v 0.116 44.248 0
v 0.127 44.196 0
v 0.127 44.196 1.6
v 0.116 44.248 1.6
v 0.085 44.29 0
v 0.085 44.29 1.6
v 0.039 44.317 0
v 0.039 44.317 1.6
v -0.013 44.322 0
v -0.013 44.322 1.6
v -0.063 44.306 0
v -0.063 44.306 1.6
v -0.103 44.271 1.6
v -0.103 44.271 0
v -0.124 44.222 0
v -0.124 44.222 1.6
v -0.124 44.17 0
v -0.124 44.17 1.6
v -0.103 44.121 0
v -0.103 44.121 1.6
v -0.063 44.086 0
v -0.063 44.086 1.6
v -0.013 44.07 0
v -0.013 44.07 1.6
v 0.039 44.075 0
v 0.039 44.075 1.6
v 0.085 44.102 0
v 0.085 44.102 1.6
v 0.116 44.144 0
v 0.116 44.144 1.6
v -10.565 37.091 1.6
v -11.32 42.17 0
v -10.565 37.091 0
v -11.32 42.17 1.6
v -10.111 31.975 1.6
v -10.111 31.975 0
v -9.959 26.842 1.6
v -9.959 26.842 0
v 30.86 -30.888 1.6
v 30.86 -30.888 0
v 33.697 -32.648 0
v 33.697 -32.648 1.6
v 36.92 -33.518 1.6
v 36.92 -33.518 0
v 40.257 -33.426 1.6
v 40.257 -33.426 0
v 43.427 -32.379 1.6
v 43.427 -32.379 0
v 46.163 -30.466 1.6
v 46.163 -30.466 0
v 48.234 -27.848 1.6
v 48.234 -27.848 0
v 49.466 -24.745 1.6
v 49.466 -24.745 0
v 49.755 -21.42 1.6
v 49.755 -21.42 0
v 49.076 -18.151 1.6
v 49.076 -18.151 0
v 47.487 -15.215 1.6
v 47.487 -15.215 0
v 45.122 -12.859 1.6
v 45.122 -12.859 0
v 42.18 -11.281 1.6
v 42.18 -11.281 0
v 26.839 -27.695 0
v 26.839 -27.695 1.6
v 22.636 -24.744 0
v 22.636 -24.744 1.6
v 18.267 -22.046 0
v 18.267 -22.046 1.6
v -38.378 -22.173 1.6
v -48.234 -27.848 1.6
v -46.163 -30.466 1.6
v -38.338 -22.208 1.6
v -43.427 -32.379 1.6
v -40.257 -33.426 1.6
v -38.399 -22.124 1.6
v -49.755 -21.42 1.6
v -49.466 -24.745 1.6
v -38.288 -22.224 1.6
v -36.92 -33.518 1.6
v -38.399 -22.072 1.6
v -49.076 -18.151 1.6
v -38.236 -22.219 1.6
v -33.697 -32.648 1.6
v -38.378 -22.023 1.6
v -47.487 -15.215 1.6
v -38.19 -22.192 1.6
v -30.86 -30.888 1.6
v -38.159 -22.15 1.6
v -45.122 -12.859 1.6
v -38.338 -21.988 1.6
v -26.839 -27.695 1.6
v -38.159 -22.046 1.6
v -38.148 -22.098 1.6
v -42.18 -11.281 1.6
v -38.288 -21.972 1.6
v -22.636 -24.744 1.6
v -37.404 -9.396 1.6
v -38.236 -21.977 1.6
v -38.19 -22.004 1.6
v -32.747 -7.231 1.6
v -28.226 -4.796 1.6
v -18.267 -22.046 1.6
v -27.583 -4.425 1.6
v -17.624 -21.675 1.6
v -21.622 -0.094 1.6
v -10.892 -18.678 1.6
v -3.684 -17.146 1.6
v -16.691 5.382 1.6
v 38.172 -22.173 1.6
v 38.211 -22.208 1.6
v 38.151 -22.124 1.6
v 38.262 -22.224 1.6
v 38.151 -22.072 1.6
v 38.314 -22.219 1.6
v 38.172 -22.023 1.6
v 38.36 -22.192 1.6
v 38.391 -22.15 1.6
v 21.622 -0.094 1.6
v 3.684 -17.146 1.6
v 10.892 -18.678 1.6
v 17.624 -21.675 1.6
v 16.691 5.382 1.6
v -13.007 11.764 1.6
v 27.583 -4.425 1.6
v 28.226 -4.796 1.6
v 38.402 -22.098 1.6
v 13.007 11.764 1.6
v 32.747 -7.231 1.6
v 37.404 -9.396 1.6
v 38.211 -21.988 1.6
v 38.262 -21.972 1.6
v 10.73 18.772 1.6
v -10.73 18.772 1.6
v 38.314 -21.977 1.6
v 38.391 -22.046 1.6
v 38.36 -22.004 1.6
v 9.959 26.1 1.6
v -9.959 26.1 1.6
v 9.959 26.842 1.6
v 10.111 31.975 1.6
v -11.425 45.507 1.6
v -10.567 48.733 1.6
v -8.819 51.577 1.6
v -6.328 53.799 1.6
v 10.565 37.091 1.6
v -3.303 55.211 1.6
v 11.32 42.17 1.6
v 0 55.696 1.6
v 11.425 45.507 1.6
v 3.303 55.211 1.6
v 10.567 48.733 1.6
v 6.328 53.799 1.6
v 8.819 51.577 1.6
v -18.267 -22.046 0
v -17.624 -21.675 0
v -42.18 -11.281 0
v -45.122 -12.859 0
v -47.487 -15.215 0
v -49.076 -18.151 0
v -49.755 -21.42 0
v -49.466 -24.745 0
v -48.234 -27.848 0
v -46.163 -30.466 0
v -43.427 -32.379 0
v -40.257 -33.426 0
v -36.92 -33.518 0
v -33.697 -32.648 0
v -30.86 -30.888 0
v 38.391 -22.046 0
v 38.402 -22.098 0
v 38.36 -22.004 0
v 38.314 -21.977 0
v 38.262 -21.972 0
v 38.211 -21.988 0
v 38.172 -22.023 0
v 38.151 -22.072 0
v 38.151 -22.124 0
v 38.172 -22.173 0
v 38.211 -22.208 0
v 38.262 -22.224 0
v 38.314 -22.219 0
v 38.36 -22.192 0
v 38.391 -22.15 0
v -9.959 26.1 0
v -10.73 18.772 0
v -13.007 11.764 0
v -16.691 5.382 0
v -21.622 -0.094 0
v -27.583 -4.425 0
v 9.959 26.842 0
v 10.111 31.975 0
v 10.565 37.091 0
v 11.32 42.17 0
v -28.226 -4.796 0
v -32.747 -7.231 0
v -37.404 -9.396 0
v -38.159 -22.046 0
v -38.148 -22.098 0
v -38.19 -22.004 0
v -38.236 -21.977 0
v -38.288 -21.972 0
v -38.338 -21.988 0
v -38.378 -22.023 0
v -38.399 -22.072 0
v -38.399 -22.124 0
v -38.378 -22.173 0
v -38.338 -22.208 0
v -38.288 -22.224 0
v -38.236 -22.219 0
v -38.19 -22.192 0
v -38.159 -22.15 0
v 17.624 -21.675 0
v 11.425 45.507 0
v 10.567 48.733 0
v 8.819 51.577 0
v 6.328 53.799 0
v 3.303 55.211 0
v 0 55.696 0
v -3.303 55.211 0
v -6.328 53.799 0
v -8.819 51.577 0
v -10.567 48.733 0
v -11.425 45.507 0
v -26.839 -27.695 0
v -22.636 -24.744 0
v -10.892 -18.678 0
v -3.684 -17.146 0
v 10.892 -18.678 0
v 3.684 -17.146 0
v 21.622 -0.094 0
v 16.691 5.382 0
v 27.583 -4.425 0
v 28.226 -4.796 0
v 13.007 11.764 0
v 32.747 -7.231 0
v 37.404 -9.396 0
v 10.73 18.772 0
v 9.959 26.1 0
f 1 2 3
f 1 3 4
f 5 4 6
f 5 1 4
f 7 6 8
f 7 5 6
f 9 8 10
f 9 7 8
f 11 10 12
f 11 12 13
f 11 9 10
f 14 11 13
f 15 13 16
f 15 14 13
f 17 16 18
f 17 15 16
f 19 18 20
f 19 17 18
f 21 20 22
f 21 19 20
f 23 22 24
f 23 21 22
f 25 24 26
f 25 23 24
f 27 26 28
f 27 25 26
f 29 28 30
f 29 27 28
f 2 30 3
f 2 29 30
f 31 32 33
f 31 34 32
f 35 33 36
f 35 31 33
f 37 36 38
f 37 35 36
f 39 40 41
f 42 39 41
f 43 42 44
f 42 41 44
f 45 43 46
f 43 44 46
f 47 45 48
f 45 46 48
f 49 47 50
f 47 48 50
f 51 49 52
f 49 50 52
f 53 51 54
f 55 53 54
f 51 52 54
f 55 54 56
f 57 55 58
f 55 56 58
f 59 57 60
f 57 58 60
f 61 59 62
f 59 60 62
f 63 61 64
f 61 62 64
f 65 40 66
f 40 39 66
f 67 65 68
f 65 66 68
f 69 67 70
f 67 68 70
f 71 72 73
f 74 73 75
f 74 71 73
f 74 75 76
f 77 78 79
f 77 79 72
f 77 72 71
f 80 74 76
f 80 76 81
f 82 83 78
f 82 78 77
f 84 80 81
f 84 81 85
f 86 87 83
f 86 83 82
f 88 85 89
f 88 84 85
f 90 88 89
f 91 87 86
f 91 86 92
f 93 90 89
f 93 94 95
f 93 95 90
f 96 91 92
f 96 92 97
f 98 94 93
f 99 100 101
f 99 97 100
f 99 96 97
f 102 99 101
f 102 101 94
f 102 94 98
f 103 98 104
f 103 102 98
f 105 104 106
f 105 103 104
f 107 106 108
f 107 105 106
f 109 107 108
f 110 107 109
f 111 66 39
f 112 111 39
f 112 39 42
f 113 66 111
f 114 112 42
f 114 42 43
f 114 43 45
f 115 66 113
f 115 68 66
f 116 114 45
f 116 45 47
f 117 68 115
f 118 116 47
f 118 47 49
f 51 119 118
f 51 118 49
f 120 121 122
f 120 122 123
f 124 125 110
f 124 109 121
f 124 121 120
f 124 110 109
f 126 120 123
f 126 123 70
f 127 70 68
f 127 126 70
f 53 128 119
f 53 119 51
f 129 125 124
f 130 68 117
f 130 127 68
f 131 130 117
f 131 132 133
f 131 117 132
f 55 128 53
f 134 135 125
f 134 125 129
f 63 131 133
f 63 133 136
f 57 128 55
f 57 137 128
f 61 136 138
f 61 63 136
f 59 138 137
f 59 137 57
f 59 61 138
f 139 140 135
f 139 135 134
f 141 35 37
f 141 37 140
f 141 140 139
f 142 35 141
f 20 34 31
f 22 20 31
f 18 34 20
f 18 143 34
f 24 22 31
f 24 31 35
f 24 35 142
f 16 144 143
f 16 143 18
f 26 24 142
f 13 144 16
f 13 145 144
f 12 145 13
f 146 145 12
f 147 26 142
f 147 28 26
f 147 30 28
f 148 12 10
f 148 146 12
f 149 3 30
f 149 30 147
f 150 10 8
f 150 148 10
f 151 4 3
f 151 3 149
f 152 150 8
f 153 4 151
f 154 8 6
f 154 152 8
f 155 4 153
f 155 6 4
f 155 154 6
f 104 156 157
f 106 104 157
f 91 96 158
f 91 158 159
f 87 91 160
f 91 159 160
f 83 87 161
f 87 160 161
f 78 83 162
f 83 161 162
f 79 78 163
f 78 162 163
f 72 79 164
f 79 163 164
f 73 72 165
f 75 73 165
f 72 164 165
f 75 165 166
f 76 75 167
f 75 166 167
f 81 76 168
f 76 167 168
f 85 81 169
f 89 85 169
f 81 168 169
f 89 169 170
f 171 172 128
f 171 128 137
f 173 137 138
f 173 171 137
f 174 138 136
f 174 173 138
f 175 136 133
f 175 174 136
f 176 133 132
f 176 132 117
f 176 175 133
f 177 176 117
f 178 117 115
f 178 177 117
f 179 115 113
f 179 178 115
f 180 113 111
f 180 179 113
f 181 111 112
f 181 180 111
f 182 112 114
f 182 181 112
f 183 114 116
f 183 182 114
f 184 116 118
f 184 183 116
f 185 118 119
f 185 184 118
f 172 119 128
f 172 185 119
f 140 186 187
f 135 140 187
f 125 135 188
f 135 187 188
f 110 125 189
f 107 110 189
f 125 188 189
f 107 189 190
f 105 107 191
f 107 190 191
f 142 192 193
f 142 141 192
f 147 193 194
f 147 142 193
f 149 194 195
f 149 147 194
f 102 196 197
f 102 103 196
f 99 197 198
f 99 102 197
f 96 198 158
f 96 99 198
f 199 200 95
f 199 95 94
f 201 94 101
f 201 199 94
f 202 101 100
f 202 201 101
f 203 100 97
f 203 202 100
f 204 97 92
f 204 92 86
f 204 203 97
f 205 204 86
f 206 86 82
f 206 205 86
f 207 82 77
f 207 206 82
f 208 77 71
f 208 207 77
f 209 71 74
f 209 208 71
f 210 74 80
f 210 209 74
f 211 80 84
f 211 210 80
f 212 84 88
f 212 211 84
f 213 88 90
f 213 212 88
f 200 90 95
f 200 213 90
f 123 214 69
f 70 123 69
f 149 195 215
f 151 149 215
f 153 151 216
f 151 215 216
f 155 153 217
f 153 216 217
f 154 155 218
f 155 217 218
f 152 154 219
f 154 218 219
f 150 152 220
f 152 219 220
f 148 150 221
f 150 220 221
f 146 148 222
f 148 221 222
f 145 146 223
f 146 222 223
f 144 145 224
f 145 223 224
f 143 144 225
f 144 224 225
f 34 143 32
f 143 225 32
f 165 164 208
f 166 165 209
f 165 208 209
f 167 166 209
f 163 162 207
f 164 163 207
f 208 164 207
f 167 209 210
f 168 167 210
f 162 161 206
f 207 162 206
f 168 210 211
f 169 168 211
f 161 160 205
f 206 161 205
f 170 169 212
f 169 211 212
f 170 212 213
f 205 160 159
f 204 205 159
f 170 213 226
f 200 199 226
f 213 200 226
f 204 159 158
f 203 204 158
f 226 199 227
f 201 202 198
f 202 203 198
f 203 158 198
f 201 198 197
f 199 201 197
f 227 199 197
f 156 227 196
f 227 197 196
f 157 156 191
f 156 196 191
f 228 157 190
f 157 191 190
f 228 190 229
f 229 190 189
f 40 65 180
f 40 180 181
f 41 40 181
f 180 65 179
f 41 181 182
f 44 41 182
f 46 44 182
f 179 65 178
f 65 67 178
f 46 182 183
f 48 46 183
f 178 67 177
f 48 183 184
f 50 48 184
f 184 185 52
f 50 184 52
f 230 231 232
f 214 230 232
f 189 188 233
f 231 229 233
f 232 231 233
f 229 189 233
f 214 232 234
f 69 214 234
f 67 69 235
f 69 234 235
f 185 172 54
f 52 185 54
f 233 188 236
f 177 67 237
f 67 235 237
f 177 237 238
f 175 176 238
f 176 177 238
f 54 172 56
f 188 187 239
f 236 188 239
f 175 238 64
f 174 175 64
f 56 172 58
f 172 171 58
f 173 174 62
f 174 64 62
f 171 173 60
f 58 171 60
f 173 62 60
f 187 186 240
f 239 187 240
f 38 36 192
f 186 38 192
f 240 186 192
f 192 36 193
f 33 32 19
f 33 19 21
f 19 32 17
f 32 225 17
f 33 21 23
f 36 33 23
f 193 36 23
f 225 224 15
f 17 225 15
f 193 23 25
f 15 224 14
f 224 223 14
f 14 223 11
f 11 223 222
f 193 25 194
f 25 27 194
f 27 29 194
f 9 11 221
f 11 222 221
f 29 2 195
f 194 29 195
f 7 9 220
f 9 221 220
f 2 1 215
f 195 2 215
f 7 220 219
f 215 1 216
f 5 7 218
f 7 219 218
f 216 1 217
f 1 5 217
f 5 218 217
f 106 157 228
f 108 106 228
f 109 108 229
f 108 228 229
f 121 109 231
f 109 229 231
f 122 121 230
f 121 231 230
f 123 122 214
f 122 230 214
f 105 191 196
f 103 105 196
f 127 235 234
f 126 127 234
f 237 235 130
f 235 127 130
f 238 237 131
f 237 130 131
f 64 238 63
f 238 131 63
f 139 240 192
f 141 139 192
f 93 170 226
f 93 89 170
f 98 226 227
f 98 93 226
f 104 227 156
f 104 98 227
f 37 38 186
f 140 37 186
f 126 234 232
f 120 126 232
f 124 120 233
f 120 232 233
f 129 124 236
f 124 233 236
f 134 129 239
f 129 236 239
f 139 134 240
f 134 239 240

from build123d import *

# Parameters (mm, degrees)
F1_R     = 0.127
F2_DEPTH = 1.6
F3_R     = 87


with BuildPart() as f2:
    # F1 (on Top) → F2 (new body)
    with BuildSketch(Plane.XY):
        with BuildLine():
            Line((9.9592921435, 26.1), (9.9592921435, 38.446))
            ThreePointArc((9.9592921435, 38.446), (0, 55.696), (-9.9592921435, 38.446))
            Line((-9.9592921435, 38.446), (-9.9592921435, 26.1))
            ThreePointArc((-9.9592921435, 26.1), (-14.6815260775, 8.476383033), (-27.5829091105, -4.425))
            Line((-27.5829091105, -4.425), (-38.2748587457, -10.598))
            ThreePointArc((-38.2748587457, -10.598), (-48.2341508892, -27.848), (-28.3155666021, -27.848))
            Line((-28.3155666021, -27.848), (-17.623616967, -21.675))
            ThreePointArc((-17.623616967, -21.675), (0, -16.952766066), (17.623616967, -21.675))
            Line((17.623616967, -21.675), (28.3155666021, -27.848))
            ThreePointArc((28.3155666021, -27.848), (48.2341508892, -27.848), (38.2748587457, -10.598))
            Line((38.2748587457, -10.598), (27.5829091105, -4.425))
            ThreePointArc((27.5829091105, -4.425), (14.6815260775, 8.476383033), (9.9592921435, 26.1))
        make_face()
        with Locations((-38.2748587457, -22.098)):
            Circle(F1_R, mode=Mode.SUBTRACT)
        with Locations((38.2748587457, -22.098)):
            Circle(F1_R, mode=Mode.SUBTRACT)
        with Locations((0, 44.196)):
            Circle(F1_R, mode=Mode.SUBTRACT)
    extrude(amount=F2_DEPTH)

    # F3
    f3_edges = [f2.edges().sort_by_distance(p)[0] for p in [
        (-28.315567, -27.848, 0.8),
        (-38.274859, -10.598, 0.8),
        (28.315567, -27.848, 0.8),
        (38.274859, -10.598, 0.8),
        (9.959292, 38.446, 0.8),
        (-9.959292, 38.446, 0.8),
    ]]
    fillet(f3_edges, radius=F3_R)


solid = f2.part
